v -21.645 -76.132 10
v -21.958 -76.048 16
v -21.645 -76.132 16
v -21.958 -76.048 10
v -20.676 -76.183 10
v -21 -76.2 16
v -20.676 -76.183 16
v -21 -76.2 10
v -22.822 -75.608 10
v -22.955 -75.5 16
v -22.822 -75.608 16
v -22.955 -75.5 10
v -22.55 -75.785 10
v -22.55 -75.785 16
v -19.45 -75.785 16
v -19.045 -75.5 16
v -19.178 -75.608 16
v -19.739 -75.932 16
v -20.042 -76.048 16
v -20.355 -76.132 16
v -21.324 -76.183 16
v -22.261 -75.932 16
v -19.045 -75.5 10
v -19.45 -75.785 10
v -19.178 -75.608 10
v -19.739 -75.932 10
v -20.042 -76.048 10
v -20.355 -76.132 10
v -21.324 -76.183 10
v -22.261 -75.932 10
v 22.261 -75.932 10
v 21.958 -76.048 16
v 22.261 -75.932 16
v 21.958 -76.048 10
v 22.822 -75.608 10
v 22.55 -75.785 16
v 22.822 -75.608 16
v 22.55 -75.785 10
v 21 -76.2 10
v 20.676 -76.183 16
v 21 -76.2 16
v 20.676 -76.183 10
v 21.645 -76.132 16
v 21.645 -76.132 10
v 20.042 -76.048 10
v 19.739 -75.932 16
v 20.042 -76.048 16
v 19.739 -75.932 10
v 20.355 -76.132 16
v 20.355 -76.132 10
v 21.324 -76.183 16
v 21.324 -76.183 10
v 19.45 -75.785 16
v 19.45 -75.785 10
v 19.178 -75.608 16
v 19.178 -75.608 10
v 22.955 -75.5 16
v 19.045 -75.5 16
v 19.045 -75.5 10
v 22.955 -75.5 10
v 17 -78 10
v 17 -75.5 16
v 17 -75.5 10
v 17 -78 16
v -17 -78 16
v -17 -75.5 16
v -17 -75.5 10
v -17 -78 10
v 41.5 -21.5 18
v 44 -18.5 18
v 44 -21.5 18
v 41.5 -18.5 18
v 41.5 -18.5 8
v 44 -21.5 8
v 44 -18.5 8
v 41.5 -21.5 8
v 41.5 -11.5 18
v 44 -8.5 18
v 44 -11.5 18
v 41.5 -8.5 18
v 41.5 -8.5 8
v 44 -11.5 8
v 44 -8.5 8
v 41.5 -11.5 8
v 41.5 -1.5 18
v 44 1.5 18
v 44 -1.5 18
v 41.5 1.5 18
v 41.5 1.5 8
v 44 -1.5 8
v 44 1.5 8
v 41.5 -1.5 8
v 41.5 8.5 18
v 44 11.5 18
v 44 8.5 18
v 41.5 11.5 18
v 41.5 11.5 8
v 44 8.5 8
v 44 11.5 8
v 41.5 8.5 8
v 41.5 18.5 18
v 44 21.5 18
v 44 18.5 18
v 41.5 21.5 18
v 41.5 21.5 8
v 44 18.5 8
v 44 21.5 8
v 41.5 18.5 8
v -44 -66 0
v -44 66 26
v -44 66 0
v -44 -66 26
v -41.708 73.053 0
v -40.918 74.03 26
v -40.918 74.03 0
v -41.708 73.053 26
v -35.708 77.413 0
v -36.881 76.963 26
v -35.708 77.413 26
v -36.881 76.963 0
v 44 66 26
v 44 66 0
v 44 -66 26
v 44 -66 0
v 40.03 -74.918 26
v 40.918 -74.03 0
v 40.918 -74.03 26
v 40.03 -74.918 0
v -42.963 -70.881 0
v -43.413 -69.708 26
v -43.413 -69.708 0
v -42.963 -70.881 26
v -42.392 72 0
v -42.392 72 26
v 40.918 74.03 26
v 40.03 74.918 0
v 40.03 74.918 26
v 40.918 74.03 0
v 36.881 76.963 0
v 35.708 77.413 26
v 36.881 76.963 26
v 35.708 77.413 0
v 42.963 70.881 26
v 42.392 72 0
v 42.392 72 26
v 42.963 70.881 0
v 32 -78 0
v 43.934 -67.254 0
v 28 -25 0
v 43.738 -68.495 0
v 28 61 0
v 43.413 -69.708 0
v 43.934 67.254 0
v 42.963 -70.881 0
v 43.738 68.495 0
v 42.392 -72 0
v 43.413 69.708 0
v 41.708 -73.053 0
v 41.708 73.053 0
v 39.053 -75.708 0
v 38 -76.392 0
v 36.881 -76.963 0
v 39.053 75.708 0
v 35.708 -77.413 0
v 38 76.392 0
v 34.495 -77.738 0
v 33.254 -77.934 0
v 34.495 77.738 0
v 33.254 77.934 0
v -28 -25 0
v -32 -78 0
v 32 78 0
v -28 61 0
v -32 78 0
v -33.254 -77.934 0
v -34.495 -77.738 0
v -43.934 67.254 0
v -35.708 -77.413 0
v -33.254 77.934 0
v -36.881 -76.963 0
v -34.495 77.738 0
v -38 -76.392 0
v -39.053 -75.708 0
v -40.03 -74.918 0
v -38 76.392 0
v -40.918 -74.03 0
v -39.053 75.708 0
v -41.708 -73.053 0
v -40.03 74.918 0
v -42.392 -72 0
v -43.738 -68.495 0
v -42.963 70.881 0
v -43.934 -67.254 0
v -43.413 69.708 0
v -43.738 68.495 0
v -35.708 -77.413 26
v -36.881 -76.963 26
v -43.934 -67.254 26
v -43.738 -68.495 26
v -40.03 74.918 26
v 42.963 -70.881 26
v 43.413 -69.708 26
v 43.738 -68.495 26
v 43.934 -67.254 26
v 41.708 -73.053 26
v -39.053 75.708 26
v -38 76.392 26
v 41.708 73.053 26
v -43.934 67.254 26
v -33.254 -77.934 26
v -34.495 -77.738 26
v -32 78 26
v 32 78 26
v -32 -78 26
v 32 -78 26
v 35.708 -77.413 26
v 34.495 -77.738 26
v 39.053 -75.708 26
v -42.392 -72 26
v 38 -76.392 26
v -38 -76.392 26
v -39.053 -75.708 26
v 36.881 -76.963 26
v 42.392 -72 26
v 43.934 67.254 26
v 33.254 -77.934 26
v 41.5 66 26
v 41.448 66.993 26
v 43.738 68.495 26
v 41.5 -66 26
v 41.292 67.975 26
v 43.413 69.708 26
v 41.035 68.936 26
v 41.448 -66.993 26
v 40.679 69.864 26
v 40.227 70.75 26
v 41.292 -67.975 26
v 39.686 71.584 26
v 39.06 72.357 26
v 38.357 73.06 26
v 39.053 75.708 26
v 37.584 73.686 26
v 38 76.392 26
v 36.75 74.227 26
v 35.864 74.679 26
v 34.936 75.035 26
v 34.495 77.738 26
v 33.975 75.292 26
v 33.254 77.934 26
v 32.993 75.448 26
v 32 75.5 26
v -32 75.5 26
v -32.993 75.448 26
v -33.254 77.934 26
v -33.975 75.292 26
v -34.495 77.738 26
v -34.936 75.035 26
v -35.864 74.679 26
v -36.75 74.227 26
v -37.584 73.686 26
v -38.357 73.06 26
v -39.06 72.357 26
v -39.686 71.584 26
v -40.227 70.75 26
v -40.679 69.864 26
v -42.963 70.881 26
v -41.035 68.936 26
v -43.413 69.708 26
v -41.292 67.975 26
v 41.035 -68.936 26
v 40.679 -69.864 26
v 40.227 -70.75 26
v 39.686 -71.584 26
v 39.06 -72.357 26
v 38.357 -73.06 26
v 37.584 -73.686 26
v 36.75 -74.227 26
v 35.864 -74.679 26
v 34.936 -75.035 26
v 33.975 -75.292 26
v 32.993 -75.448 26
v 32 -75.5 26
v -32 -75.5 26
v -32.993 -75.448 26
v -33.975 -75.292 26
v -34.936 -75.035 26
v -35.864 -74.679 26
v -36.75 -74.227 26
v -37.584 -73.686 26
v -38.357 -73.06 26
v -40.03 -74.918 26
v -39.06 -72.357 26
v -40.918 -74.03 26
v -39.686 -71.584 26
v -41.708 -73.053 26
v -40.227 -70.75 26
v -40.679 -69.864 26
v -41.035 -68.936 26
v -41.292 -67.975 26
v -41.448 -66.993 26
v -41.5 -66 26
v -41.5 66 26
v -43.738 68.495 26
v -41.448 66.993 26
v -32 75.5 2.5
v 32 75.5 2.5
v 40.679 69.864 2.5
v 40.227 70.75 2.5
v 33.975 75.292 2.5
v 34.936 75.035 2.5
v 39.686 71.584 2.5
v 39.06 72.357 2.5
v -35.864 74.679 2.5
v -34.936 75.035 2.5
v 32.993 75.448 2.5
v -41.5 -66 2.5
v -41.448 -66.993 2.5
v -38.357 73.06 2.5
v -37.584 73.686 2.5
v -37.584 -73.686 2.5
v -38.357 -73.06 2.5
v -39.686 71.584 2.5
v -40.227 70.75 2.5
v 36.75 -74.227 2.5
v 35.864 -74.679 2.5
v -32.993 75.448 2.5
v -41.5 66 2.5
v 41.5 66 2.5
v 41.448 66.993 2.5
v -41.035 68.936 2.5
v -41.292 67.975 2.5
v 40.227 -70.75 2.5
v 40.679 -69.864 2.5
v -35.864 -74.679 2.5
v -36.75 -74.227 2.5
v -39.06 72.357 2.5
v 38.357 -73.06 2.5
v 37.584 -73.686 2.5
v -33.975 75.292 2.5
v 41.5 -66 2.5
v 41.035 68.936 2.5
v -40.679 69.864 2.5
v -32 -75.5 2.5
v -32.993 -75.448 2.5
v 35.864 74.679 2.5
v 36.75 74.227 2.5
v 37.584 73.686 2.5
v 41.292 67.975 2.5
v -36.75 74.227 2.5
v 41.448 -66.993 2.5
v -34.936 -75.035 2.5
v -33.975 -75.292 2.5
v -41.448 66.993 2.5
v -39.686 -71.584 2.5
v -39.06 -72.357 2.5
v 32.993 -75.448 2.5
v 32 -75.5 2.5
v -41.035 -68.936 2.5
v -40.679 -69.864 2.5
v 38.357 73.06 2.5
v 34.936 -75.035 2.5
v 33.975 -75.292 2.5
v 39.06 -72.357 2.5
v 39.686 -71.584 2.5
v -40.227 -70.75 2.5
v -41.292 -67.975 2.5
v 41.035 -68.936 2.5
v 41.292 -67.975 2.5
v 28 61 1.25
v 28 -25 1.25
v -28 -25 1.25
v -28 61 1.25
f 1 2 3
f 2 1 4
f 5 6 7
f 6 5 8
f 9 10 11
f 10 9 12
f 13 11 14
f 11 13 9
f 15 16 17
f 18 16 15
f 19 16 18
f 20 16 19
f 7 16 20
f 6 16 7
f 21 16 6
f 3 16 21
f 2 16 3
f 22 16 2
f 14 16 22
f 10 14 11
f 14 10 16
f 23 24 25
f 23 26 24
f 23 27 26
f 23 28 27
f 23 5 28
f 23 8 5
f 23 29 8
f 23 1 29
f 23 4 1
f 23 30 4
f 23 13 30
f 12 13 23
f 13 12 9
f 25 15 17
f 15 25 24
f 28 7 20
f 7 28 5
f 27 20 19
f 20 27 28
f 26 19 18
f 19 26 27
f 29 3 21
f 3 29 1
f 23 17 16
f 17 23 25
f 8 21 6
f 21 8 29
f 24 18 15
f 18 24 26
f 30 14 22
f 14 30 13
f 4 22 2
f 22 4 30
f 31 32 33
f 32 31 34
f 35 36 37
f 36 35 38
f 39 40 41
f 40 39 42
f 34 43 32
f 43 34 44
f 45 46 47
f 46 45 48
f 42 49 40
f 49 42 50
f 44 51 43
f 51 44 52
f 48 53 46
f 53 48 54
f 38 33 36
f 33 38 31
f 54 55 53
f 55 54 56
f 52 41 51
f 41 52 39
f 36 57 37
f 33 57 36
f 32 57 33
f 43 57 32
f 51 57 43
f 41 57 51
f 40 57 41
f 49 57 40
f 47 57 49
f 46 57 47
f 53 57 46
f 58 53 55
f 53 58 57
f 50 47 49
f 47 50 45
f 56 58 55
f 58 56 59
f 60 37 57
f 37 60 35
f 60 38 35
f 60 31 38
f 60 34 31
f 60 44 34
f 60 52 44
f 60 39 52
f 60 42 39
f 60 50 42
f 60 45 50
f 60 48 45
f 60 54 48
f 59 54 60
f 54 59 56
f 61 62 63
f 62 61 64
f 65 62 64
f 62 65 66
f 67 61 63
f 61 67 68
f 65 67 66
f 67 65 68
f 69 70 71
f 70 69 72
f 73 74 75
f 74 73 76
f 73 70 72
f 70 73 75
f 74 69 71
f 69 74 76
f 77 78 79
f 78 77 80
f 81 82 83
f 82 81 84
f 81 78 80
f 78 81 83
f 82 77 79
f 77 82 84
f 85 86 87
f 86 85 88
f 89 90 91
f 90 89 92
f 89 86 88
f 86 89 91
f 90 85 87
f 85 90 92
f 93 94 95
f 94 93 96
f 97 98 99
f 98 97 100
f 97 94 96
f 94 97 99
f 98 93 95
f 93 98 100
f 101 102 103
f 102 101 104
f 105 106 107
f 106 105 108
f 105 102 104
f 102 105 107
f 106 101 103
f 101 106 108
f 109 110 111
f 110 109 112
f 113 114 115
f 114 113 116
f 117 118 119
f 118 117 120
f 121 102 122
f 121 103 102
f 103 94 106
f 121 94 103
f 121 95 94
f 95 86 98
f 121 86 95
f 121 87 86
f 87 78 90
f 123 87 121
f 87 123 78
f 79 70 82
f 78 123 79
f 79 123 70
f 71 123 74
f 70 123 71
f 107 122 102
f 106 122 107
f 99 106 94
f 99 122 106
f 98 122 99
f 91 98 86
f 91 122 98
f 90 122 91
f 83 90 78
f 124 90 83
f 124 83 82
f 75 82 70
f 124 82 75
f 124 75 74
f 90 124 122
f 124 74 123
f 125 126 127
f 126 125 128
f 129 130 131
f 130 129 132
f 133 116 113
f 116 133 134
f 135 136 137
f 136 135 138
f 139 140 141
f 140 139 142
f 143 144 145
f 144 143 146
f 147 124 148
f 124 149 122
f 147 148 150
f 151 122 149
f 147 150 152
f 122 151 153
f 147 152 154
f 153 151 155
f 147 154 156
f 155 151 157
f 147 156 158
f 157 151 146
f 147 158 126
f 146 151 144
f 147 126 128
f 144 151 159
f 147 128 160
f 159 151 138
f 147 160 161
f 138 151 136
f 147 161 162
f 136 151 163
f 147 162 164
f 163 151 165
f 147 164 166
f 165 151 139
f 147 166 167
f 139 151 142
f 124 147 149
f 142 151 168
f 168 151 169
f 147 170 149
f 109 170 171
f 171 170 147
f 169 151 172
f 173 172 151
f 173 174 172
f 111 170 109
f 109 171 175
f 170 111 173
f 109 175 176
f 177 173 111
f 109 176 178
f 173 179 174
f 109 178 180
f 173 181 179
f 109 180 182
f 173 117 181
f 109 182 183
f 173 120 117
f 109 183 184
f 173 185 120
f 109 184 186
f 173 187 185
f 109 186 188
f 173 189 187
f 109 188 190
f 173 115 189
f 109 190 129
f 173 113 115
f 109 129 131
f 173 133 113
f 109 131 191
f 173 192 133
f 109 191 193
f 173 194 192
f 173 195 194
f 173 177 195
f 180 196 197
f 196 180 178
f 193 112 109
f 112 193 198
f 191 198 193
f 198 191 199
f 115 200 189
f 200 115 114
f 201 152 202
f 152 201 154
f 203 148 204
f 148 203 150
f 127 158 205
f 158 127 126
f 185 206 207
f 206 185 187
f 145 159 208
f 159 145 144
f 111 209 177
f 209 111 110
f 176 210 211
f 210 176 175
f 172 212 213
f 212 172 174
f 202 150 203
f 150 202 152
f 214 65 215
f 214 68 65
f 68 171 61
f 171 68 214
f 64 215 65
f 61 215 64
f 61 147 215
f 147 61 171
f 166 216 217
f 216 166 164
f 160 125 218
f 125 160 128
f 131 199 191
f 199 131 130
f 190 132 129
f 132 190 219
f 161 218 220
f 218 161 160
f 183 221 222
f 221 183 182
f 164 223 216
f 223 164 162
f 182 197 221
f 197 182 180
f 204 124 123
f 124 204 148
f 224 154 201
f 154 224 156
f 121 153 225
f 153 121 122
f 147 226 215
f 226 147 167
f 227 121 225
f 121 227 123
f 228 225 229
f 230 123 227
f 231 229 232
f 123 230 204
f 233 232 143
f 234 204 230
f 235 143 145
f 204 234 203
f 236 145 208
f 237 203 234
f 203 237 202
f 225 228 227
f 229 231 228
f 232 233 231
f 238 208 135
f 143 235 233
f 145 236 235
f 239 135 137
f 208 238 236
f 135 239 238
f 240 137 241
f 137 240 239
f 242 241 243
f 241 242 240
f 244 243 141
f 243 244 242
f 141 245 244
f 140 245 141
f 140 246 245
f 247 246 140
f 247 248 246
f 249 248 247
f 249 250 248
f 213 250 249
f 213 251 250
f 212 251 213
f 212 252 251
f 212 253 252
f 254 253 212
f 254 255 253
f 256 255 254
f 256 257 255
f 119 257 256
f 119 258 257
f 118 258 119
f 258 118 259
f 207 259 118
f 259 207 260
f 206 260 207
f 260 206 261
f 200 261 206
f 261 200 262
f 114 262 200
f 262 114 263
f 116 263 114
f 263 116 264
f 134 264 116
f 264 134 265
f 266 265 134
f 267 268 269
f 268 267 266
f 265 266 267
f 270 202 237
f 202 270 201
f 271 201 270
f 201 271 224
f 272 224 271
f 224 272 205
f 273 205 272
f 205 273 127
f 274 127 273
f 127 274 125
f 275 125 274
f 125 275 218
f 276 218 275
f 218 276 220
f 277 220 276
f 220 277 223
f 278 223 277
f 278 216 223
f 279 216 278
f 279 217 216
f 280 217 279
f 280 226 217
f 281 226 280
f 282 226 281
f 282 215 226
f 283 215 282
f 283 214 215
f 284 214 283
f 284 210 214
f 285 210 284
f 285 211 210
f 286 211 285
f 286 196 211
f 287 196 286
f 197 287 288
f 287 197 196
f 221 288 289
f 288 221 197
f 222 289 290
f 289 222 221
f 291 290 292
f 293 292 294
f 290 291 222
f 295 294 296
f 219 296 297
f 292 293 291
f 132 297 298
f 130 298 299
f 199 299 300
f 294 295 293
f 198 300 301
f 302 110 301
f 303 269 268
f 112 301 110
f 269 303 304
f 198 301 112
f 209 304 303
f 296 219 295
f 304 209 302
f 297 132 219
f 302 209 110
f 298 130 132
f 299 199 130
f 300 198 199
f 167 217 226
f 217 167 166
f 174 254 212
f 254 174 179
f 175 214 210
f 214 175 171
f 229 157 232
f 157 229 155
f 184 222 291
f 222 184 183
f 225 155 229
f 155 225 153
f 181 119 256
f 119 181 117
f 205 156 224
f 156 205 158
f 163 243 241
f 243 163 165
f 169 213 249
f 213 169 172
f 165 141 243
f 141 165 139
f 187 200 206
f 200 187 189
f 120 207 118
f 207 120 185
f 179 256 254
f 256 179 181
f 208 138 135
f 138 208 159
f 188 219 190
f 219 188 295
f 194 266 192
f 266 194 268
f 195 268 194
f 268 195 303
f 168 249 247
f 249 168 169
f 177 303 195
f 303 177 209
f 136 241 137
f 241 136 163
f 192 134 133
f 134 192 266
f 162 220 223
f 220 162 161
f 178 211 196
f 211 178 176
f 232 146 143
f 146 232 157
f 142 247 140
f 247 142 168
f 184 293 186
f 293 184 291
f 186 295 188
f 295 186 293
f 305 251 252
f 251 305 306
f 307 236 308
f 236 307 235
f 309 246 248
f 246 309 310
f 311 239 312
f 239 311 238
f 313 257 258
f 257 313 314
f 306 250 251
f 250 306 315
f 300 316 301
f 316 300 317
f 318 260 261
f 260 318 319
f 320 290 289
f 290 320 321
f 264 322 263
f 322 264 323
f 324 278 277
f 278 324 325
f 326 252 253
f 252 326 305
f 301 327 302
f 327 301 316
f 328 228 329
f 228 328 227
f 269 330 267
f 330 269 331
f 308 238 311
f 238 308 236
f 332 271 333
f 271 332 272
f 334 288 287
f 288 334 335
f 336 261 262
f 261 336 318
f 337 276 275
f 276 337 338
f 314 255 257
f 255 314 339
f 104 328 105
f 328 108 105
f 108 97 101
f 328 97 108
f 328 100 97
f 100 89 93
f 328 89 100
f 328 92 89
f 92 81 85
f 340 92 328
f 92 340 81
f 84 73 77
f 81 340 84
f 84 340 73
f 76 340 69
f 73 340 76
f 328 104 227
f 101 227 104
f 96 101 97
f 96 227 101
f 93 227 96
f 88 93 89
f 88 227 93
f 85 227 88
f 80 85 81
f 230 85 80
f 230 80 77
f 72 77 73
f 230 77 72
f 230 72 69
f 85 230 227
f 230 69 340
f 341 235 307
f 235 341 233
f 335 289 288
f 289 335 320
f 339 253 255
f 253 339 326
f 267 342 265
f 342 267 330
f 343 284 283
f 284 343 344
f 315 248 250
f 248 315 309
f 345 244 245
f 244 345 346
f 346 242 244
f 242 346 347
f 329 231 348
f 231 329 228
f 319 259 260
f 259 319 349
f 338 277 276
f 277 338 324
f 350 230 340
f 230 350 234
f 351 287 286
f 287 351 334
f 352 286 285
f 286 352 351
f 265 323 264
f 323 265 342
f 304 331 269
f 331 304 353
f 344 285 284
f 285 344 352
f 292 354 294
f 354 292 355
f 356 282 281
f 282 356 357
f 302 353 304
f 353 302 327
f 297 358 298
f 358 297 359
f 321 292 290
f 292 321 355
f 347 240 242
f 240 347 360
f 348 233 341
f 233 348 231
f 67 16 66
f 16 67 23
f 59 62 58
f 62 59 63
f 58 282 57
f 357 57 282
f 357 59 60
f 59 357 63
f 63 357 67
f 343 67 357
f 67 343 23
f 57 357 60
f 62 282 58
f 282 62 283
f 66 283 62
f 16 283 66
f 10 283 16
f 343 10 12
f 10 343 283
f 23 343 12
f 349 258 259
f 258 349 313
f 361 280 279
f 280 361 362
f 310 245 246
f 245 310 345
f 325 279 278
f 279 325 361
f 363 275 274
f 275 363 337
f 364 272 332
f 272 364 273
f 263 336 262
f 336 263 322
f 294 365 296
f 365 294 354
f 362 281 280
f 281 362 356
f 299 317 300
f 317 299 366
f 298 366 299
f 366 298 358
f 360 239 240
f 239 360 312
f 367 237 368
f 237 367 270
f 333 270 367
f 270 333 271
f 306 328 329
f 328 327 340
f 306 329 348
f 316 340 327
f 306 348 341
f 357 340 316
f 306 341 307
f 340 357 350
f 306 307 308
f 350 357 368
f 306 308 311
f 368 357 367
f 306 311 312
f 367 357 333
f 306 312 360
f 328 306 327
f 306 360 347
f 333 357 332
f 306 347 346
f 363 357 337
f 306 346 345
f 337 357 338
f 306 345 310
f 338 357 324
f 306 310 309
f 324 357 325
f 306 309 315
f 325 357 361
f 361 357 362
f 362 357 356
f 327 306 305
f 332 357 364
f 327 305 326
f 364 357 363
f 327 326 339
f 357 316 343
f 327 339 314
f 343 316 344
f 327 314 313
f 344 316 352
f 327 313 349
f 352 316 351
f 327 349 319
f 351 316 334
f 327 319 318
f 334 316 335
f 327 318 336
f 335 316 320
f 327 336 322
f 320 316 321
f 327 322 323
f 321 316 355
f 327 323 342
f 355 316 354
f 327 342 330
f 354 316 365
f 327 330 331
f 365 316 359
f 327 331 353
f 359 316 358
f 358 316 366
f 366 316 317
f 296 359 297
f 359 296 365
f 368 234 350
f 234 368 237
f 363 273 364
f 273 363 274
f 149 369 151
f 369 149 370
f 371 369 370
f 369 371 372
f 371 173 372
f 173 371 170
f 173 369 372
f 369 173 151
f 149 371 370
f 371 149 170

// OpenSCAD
// RT Hexadecimal Medical Scanner Enclosure (OpenSCAD)
$fn = 60;

// Handheld Main Chassis Dimensions (mm)
body_w = 88;
body_h = 156;
body_d = 26; // Extra depth for RT 3D Vapor Chamber & battery
corner_r = 12;
wall = 2.5;

// Display & Dock Dimensions
scr_w = 56;
scr_h = 86;
dock_w = 34;
dock_h = 10;
dock_d = 6;

module rounded_chassis(w, h, d, r) {
    hull() {
        for (x = [-w/2 + r, w/2 - r])
            for (y = [-h/2 + r, h/2 - r])
                translate([x, y, 0])
                    cylinder(h = d, r = r);
    }
}

module hex_pogo_dock() {
    // Recessed 6-pin hex bus + alignment magnet pockets
    cube([dock_w, dock_h, dock_d], center = true);
    for (x = [-dock_w/2 - 4, dock_w/2 + 4]) {
        translate([x, 0, 0])
            cylinder(h = dock_d, r = 3.1, center = true); // 6mm neodymium magnet
    }
}

module main_scanner_body() {
    difference() {
        rounded_chassis(body_w, body_h, body_d, corner_r);
        
        // Internal cavity for 8-layer RT PCB & thermal armor
        translate([0, 0, wall])
            rounded_chassis(body_w - wall*2, body_h - wall*2, body_d, corner_r - wall);
        
        // Touchscreen cutout
        translate([0, 18, -1])
            cube([scr_w, scr_h, wall + 2], center = true);
            
        // Bottom Hex-Bus Pogo Dock (Blood / Gut / Temp modules)
        translate([0, -body_h/2 + dock_h/2 - 0.1, body_d/2])
            hex_pogo_dock();
            
        // Side centrifugal exhaust vents for RT cooling
        for (y = [-20, -10, 0, 10, 20]) {
            translate([body_w/2 - wall/2, y, body_d/2])
                cube([wall + 2, 3, 10], center = true);
        }
    }
}

main_scanner_body();
